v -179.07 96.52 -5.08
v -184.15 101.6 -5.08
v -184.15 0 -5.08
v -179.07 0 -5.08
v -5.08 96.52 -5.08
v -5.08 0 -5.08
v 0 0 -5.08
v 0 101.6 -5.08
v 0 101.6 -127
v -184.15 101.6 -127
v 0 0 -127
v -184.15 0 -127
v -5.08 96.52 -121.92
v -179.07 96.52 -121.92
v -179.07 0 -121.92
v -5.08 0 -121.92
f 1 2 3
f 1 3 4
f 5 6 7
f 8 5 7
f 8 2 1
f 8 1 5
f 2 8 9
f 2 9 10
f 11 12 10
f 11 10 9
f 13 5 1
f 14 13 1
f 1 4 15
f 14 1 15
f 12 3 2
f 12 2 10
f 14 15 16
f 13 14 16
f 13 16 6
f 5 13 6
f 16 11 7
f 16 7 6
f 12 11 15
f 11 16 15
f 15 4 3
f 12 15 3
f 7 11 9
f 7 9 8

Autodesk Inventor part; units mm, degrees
ref_plane "YZ Plane" through (0, 0, 0) normal (1, 0, 0) x (0, 1, 0)
ref_plane "XZ Plane" through (0, 0, 0) normal (0, 1, 0) x (-1, 0, 0)
ref_plane "XY Plane" through (0, 0, 0) normal (0, 0, 1) x (1, 0, 0)
sketch "Sketch2" plane through (0, 0, 0) normal (0, 1, 0) x (-1, 0, 0)
  line L0 (0, 0) -> (184.15, 0)
  line L1 (184.15, 0) -> (184.15, -127)
  line L2 (184.15, -127) -> (0, -127)
  line L3 (0, -127) -> (0, 0)
  line L4 (179.07, -121.92) -> (5.08, -121.92)
  line L5 (5.08, -121.92) -> (5.08, -5.08)
  line L6 (5.08, -5.08) -> (179.07, -5.08)
  line L7 (179.07, -5.08) -> (179.07, -121.92)
  dimension "d0" = 184.15
  dimension "d1" = 127
  dimension "d2" = 5.08
  dimension "d3" = 5.08
  dimension "d4" = 5.08
  dimension "d5" = 5.08
extrude "Extrusion1" add sketch "Sketch2" along normal blind 101.6 contours L0 L1 L2 L3 | L4 L5 L6 L7
extrude "Extrusion2" cut sketch "Sketch2" along normal blind 96.52 contours L4 L5 L6 L7
sketch "Sketch3" plane through (-184.15, 0, 0) normal (0, 0, 1) x (1, 0, 0)
  line L0 (184.15, 0) -> (184.15, 101.6) projected
  line L1 (184.15, 0) -> (0, 0)
  line L2 (0, 0) -> (0, 101.6)
  line L3 (0, 101.6) -> (184.15, 101.6)
  line L4 (184.15, 101.6) -> (184.15, 0)
  dimension "d10" = 184.15
  dimension "d11" = 101.6
extrude "Extrusion3" cut sketch "Sketch3" against normal up to surface (5.08 mm away)
properties part number "Box_Top"
